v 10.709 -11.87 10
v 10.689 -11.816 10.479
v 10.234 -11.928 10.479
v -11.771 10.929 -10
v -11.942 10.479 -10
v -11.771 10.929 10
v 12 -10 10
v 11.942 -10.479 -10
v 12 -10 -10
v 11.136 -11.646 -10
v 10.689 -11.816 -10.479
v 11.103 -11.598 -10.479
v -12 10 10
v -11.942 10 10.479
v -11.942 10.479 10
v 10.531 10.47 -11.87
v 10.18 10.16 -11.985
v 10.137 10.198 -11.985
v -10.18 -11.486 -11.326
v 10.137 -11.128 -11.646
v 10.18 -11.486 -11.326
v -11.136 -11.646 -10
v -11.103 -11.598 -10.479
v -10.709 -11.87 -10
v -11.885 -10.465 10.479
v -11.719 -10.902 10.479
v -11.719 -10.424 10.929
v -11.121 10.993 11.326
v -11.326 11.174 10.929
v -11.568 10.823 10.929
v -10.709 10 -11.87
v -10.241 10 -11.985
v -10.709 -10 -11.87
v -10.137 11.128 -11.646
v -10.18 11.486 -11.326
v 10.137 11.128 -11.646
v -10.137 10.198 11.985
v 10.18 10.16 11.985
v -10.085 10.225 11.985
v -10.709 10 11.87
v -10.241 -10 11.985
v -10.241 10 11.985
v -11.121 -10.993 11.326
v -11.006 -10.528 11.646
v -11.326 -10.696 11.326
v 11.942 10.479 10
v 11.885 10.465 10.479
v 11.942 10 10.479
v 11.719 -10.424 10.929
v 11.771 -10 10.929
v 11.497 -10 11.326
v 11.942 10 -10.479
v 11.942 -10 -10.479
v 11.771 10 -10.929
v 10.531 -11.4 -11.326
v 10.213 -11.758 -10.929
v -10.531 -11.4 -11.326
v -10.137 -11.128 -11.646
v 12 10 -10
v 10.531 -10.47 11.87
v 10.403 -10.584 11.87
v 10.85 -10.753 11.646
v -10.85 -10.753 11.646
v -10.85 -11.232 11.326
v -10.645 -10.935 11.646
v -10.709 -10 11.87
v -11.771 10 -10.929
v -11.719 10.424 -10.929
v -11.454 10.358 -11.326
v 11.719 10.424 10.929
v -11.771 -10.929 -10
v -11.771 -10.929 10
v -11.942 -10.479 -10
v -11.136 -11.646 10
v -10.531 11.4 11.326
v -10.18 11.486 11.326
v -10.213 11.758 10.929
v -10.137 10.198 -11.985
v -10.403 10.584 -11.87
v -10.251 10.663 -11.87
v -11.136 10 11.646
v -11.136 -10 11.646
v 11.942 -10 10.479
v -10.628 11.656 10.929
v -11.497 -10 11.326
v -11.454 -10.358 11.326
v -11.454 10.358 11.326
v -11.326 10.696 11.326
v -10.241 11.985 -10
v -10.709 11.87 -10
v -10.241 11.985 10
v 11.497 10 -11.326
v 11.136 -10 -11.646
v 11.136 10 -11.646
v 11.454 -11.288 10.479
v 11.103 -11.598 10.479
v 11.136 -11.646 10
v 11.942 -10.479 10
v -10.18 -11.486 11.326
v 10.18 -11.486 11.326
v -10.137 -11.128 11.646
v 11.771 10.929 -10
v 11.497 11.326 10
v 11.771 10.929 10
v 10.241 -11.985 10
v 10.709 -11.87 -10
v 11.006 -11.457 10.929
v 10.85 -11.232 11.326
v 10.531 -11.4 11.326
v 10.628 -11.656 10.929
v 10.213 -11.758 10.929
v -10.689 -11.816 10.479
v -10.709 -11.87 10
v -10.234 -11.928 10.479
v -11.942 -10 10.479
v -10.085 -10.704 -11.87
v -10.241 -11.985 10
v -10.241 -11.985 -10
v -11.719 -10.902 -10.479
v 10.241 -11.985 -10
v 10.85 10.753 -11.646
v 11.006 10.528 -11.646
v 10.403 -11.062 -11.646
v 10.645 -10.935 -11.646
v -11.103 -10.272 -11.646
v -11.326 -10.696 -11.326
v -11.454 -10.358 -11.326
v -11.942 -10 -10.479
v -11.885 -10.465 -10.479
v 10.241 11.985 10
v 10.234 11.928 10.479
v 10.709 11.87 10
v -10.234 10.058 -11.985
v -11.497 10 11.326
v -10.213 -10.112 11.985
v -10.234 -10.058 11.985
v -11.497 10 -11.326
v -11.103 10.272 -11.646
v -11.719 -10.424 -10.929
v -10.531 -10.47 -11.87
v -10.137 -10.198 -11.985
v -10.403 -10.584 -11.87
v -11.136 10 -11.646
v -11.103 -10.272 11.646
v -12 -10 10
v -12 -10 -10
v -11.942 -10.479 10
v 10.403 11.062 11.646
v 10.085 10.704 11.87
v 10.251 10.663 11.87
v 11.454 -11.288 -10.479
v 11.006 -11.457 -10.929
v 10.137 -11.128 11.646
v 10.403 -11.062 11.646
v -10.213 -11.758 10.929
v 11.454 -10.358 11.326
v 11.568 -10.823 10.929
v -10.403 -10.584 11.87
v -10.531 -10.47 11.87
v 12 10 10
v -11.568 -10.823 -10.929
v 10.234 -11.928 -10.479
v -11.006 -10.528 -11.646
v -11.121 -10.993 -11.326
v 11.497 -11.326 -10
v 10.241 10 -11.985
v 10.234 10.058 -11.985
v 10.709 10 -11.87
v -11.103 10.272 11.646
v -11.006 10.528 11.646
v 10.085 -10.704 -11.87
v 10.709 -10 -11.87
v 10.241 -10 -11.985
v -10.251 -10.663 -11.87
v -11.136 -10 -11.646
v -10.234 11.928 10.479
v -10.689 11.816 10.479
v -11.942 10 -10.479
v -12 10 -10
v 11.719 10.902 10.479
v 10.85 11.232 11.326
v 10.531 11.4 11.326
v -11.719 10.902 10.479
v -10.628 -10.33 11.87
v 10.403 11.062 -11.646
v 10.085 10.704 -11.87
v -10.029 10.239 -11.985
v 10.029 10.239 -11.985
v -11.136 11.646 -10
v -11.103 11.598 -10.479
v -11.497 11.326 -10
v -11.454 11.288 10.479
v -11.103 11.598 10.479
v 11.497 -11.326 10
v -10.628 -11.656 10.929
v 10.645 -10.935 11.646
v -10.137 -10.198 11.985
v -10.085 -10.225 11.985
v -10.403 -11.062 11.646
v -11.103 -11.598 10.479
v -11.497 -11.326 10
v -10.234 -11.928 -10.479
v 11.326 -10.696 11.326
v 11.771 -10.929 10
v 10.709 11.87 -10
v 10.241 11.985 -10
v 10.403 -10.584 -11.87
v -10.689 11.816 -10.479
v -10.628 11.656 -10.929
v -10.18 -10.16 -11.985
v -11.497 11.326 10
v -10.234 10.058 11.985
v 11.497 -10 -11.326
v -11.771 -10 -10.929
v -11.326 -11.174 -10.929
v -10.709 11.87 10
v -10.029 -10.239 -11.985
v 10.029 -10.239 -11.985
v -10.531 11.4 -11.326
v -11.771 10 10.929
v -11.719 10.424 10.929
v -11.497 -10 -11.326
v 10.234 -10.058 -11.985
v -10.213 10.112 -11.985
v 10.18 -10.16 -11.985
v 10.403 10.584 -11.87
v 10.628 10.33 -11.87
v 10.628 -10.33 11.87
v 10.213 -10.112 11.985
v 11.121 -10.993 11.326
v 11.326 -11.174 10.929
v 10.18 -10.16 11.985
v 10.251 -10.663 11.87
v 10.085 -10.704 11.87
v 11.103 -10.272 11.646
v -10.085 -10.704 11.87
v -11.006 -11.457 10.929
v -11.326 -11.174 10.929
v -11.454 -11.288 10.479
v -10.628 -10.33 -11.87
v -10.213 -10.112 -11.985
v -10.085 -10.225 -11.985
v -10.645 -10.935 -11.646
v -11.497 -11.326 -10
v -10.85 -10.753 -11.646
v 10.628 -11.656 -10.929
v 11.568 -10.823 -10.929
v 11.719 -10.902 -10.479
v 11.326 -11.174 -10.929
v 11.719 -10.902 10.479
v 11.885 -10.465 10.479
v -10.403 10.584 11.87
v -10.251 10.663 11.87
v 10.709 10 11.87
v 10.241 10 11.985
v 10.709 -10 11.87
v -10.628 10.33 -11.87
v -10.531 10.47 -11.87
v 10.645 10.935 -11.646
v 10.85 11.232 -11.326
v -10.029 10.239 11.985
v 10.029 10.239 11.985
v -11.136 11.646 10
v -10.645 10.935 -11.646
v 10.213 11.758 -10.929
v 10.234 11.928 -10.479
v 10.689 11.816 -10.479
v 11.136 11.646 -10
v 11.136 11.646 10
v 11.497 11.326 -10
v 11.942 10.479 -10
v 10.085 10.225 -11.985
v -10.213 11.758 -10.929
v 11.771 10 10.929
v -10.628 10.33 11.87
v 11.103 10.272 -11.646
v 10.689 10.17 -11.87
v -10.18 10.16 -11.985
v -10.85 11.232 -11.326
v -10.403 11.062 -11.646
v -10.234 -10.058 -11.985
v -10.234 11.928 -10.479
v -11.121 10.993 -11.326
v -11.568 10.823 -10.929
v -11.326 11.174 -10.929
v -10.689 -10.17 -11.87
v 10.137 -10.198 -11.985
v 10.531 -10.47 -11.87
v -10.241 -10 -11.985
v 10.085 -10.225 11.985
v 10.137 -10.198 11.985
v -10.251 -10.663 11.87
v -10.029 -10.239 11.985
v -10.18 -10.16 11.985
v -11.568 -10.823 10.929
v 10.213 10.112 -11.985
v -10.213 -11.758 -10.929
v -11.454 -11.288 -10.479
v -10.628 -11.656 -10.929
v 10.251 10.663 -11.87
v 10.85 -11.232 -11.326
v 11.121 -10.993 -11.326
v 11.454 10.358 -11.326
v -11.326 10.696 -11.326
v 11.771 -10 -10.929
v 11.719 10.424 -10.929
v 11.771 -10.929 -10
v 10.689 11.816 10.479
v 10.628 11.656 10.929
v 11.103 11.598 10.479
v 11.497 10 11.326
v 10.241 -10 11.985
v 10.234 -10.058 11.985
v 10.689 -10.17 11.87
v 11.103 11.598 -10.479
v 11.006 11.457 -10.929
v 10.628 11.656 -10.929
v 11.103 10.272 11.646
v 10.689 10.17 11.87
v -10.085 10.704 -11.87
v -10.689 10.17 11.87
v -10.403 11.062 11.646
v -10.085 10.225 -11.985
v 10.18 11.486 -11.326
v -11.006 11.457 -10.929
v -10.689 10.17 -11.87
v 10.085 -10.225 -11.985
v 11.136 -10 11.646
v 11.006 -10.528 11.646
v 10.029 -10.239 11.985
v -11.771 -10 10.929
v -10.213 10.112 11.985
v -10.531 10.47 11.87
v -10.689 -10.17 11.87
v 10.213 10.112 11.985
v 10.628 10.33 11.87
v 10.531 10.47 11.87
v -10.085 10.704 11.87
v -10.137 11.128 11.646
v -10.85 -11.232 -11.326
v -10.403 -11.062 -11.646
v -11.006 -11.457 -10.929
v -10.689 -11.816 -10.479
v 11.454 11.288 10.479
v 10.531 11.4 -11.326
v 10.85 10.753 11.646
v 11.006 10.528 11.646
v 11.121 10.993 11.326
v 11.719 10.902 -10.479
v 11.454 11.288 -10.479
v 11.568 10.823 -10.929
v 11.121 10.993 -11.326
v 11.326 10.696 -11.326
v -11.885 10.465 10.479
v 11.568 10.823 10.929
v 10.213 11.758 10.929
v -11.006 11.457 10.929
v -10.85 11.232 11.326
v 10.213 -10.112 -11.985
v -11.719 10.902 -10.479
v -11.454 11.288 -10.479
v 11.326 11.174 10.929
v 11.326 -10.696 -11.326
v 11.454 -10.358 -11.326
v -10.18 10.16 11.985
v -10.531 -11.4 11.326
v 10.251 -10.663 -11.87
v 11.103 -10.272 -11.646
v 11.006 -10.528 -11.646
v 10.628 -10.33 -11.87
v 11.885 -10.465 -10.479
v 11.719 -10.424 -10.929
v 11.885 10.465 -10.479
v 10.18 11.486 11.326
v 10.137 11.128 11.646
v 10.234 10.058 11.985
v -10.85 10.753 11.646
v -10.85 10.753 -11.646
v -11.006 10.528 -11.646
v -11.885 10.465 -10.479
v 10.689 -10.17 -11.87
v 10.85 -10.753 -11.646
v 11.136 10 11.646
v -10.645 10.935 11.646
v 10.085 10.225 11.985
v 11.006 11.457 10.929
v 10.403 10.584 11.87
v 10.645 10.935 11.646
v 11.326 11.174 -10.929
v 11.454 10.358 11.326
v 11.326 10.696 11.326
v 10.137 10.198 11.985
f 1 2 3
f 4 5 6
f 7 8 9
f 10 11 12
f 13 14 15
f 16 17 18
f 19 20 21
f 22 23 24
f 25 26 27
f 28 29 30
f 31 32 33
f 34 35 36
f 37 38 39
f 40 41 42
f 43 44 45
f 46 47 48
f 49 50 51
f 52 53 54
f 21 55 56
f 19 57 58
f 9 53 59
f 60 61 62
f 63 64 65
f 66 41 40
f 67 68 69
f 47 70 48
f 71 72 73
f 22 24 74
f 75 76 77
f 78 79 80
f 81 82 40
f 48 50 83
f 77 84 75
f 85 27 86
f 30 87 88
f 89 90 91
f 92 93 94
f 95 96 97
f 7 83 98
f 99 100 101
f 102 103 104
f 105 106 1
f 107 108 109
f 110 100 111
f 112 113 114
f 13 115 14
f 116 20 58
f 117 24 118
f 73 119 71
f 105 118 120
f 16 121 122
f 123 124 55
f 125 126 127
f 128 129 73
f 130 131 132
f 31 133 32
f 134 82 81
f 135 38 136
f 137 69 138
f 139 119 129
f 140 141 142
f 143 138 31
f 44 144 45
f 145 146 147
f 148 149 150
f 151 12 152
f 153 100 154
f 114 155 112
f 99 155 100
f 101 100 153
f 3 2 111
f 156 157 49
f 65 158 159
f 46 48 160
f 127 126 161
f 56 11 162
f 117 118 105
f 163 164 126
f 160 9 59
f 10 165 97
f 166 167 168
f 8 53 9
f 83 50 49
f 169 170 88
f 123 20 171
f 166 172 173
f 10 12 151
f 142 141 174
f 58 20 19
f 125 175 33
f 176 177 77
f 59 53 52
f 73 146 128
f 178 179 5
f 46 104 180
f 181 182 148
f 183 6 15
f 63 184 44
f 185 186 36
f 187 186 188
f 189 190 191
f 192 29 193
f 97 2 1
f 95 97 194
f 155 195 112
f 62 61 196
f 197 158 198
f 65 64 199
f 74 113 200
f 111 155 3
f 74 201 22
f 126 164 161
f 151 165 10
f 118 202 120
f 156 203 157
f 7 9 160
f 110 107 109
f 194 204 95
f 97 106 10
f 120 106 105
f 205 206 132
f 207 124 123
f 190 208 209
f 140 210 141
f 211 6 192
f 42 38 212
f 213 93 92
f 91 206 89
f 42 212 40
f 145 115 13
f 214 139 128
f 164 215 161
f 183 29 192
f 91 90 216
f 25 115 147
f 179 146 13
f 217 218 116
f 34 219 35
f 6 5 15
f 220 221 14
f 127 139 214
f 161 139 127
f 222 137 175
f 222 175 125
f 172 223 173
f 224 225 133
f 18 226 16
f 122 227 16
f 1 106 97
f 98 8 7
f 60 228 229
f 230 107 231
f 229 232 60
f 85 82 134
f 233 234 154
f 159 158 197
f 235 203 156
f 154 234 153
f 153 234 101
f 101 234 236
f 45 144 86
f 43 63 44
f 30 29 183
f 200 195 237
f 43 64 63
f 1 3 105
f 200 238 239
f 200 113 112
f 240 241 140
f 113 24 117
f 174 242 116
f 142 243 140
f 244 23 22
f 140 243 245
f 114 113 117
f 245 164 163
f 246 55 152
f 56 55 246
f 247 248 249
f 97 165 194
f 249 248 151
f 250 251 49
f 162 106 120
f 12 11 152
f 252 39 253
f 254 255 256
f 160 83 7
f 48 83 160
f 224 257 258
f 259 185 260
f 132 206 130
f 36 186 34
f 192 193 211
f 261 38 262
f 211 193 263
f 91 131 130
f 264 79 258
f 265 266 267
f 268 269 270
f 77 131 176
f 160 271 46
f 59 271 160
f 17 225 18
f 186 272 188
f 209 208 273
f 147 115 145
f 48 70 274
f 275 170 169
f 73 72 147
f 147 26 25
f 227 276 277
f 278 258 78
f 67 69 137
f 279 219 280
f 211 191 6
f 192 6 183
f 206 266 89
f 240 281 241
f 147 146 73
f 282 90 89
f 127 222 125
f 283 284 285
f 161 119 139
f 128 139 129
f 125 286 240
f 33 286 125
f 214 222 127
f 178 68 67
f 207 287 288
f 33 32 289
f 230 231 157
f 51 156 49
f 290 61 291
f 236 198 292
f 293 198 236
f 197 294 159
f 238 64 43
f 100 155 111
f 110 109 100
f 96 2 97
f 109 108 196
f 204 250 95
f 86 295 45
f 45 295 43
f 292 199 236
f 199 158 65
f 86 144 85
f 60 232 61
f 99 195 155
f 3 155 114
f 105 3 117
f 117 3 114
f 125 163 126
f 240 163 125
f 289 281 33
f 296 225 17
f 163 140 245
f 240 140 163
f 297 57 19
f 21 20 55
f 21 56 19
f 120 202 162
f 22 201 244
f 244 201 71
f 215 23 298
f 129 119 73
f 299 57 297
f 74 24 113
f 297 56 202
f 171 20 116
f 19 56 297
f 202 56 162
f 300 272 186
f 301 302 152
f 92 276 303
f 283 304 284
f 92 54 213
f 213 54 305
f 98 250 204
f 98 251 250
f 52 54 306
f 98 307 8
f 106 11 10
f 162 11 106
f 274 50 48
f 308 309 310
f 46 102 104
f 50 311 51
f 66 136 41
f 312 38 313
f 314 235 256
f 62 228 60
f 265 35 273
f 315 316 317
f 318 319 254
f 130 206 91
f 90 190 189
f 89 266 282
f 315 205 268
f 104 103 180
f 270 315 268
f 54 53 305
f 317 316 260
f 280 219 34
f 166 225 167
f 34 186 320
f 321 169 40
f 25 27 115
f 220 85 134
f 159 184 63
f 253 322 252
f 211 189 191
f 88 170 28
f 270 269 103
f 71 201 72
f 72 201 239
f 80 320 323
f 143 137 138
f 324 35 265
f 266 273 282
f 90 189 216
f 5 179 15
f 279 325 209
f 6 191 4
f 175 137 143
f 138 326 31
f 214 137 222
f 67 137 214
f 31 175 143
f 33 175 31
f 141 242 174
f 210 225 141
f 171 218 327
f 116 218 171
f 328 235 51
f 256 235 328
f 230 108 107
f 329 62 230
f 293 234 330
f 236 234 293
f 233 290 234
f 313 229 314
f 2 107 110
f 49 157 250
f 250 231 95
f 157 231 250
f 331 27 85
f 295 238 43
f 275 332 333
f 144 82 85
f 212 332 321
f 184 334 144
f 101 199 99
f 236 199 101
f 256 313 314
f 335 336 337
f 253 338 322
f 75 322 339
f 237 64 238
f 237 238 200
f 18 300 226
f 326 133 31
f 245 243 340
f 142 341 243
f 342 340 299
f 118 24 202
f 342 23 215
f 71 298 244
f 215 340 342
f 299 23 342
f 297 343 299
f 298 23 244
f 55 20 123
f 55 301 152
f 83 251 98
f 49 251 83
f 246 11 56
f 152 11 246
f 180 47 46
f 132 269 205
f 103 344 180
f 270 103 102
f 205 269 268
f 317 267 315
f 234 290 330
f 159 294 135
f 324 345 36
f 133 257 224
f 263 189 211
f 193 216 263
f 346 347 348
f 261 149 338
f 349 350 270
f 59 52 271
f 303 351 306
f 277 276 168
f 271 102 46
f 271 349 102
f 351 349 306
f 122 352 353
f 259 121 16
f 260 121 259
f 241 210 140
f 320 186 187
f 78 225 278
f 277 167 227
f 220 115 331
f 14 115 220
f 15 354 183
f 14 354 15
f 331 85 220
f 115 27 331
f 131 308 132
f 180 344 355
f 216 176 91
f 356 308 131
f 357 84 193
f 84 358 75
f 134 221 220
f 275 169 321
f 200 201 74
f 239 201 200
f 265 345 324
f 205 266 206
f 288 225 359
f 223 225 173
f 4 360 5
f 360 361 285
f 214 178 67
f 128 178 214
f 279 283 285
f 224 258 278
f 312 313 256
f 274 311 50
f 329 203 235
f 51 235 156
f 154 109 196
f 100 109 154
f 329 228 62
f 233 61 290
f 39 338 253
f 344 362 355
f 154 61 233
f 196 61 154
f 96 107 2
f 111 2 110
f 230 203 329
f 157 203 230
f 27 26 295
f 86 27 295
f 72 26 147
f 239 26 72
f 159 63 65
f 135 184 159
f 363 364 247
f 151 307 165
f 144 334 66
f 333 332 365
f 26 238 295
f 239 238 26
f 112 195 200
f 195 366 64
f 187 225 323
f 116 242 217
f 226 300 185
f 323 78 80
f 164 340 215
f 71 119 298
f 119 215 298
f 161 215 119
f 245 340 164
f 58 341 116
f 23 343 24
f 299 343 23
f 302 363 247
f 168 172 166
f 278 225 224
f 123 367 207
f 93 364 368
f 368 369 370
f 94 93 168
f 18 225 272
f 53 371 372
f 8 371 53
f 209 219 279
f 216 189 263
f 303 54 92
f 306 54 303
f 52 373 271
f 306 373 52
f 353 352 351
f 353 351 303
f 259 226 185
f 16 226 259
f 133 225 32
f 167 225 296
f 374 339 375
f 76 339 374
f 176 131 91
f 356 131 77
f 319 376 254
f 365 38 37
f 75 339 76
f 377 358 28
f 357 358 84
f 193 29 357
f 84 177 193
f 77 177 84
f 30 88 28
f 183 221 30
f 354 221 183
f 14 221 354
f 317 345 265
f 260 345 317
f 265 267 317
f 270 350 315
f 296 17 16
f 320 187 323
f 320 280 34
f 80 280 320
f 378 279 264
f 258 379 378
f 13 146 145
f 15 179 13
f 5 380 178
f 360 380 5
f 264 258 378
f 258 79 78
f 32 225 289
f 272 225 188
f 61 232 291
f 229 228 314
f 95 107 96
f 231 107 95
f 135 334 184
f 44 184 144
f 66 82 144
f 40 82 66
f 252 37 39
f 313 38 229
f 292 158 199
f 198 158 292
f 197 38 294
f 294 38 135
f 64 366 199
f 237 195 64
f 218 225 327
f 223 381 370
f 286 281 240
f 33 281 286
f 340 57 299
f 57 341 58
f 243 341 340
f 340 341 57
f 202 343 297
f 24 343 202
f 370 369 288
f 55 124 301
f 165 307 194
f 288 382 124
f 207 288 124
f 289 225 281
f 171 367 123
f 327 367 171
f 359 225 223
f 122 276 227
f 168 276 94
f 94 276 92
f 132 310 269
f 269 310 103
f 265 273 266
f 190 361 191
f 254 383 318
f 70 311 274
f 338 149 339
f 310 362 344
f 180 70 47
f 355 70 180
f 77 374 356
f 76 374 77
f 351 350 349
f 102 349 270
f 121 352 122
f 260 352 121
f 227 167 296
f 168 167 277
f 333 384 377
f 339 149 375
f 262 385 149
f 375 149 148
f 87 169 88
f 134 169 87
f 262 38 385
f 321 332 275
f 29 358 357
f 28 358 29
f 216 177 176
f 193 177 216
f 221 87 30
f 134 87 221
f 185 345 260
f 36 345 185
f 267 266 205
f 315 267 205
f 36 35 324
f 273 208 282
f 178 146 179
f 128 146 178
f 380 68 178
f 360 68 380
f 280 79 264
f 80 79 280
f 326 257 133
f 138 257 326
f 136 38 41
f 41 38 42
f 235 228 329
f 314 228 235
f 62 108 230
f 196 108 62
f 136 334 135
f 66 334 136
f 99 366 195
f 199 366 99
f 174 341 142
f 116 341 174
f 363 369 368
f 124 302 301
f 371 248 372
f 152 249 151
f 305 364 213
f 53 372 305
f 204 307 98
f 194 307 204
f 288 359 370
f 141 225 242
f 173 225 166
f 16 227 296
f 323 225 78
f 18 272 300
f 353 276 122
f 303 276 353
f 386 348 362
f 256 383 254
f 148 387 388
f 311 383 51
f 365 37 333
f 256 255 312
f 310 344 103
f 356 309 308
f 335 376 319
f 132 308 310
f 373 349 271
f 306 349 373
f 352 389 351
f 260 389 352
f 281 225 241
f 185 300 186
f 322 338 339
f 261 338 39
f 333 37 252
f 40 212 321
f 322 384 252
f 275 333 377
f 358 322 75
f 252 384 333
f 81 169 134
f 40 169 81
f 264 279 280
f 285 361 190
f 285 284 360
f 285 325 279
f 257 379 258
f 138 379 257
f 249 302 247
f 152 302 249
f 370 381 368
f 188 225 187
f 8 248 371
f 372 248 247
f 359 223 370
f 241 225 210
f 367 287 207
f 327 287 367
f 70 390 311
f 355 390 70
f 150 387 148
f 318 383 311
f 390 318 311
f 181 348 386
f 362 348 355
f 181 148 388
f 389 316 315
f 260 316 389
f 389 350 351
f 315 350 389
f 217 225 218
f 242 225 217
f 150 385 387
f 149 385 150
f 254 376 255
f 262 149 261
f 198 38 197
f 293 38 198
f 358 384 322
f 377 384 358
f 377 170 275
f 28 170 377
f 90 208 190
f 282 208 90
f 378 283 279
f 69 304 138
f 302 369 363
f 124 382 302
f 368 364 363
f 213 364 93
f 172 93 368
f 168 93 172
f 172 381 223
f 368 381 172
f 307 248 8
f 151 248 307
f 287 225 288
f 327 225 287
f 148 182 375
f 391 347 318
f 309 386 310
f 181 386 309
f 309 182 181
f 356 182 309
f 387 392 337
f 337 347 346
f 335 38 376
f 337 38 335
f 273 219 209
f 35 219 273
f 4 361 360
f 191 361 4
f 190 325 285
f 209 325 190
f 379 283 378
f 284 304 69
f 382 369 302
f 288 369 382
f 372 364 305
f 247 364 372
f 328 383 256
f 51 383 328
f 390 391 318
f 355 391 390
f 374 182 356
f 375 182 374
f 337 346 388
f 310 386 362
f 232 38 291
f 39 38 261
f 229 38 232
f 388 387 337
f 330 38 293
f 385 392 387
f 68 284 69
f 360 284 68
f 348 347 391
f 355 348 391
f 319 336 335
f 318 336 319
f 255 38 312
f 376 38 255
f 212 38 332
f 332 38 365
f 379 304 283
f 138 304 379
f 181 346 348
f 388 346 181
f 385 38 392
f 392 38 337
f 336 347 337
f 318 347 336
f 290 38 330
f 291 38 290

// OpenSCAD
$fa=1;
$fs=0.5;

hull() {
  translate([-10, -10, -10]) sphere(r=2);
  translate([-10, -10, 10]) sphere(r=2);
  translate([10, -10, 10]) sphere(r=2);
  translate([10, -10, -10]) sphere(r=2);
  translate([10, 10, -10]) sphere(r=2);
  translate([10, 10, 10]) sphere(r=2);
  translate([-10, 10, 10]) sphere(r=2);
  translate([-10, 10, -10]) sphere(r=2);
}
